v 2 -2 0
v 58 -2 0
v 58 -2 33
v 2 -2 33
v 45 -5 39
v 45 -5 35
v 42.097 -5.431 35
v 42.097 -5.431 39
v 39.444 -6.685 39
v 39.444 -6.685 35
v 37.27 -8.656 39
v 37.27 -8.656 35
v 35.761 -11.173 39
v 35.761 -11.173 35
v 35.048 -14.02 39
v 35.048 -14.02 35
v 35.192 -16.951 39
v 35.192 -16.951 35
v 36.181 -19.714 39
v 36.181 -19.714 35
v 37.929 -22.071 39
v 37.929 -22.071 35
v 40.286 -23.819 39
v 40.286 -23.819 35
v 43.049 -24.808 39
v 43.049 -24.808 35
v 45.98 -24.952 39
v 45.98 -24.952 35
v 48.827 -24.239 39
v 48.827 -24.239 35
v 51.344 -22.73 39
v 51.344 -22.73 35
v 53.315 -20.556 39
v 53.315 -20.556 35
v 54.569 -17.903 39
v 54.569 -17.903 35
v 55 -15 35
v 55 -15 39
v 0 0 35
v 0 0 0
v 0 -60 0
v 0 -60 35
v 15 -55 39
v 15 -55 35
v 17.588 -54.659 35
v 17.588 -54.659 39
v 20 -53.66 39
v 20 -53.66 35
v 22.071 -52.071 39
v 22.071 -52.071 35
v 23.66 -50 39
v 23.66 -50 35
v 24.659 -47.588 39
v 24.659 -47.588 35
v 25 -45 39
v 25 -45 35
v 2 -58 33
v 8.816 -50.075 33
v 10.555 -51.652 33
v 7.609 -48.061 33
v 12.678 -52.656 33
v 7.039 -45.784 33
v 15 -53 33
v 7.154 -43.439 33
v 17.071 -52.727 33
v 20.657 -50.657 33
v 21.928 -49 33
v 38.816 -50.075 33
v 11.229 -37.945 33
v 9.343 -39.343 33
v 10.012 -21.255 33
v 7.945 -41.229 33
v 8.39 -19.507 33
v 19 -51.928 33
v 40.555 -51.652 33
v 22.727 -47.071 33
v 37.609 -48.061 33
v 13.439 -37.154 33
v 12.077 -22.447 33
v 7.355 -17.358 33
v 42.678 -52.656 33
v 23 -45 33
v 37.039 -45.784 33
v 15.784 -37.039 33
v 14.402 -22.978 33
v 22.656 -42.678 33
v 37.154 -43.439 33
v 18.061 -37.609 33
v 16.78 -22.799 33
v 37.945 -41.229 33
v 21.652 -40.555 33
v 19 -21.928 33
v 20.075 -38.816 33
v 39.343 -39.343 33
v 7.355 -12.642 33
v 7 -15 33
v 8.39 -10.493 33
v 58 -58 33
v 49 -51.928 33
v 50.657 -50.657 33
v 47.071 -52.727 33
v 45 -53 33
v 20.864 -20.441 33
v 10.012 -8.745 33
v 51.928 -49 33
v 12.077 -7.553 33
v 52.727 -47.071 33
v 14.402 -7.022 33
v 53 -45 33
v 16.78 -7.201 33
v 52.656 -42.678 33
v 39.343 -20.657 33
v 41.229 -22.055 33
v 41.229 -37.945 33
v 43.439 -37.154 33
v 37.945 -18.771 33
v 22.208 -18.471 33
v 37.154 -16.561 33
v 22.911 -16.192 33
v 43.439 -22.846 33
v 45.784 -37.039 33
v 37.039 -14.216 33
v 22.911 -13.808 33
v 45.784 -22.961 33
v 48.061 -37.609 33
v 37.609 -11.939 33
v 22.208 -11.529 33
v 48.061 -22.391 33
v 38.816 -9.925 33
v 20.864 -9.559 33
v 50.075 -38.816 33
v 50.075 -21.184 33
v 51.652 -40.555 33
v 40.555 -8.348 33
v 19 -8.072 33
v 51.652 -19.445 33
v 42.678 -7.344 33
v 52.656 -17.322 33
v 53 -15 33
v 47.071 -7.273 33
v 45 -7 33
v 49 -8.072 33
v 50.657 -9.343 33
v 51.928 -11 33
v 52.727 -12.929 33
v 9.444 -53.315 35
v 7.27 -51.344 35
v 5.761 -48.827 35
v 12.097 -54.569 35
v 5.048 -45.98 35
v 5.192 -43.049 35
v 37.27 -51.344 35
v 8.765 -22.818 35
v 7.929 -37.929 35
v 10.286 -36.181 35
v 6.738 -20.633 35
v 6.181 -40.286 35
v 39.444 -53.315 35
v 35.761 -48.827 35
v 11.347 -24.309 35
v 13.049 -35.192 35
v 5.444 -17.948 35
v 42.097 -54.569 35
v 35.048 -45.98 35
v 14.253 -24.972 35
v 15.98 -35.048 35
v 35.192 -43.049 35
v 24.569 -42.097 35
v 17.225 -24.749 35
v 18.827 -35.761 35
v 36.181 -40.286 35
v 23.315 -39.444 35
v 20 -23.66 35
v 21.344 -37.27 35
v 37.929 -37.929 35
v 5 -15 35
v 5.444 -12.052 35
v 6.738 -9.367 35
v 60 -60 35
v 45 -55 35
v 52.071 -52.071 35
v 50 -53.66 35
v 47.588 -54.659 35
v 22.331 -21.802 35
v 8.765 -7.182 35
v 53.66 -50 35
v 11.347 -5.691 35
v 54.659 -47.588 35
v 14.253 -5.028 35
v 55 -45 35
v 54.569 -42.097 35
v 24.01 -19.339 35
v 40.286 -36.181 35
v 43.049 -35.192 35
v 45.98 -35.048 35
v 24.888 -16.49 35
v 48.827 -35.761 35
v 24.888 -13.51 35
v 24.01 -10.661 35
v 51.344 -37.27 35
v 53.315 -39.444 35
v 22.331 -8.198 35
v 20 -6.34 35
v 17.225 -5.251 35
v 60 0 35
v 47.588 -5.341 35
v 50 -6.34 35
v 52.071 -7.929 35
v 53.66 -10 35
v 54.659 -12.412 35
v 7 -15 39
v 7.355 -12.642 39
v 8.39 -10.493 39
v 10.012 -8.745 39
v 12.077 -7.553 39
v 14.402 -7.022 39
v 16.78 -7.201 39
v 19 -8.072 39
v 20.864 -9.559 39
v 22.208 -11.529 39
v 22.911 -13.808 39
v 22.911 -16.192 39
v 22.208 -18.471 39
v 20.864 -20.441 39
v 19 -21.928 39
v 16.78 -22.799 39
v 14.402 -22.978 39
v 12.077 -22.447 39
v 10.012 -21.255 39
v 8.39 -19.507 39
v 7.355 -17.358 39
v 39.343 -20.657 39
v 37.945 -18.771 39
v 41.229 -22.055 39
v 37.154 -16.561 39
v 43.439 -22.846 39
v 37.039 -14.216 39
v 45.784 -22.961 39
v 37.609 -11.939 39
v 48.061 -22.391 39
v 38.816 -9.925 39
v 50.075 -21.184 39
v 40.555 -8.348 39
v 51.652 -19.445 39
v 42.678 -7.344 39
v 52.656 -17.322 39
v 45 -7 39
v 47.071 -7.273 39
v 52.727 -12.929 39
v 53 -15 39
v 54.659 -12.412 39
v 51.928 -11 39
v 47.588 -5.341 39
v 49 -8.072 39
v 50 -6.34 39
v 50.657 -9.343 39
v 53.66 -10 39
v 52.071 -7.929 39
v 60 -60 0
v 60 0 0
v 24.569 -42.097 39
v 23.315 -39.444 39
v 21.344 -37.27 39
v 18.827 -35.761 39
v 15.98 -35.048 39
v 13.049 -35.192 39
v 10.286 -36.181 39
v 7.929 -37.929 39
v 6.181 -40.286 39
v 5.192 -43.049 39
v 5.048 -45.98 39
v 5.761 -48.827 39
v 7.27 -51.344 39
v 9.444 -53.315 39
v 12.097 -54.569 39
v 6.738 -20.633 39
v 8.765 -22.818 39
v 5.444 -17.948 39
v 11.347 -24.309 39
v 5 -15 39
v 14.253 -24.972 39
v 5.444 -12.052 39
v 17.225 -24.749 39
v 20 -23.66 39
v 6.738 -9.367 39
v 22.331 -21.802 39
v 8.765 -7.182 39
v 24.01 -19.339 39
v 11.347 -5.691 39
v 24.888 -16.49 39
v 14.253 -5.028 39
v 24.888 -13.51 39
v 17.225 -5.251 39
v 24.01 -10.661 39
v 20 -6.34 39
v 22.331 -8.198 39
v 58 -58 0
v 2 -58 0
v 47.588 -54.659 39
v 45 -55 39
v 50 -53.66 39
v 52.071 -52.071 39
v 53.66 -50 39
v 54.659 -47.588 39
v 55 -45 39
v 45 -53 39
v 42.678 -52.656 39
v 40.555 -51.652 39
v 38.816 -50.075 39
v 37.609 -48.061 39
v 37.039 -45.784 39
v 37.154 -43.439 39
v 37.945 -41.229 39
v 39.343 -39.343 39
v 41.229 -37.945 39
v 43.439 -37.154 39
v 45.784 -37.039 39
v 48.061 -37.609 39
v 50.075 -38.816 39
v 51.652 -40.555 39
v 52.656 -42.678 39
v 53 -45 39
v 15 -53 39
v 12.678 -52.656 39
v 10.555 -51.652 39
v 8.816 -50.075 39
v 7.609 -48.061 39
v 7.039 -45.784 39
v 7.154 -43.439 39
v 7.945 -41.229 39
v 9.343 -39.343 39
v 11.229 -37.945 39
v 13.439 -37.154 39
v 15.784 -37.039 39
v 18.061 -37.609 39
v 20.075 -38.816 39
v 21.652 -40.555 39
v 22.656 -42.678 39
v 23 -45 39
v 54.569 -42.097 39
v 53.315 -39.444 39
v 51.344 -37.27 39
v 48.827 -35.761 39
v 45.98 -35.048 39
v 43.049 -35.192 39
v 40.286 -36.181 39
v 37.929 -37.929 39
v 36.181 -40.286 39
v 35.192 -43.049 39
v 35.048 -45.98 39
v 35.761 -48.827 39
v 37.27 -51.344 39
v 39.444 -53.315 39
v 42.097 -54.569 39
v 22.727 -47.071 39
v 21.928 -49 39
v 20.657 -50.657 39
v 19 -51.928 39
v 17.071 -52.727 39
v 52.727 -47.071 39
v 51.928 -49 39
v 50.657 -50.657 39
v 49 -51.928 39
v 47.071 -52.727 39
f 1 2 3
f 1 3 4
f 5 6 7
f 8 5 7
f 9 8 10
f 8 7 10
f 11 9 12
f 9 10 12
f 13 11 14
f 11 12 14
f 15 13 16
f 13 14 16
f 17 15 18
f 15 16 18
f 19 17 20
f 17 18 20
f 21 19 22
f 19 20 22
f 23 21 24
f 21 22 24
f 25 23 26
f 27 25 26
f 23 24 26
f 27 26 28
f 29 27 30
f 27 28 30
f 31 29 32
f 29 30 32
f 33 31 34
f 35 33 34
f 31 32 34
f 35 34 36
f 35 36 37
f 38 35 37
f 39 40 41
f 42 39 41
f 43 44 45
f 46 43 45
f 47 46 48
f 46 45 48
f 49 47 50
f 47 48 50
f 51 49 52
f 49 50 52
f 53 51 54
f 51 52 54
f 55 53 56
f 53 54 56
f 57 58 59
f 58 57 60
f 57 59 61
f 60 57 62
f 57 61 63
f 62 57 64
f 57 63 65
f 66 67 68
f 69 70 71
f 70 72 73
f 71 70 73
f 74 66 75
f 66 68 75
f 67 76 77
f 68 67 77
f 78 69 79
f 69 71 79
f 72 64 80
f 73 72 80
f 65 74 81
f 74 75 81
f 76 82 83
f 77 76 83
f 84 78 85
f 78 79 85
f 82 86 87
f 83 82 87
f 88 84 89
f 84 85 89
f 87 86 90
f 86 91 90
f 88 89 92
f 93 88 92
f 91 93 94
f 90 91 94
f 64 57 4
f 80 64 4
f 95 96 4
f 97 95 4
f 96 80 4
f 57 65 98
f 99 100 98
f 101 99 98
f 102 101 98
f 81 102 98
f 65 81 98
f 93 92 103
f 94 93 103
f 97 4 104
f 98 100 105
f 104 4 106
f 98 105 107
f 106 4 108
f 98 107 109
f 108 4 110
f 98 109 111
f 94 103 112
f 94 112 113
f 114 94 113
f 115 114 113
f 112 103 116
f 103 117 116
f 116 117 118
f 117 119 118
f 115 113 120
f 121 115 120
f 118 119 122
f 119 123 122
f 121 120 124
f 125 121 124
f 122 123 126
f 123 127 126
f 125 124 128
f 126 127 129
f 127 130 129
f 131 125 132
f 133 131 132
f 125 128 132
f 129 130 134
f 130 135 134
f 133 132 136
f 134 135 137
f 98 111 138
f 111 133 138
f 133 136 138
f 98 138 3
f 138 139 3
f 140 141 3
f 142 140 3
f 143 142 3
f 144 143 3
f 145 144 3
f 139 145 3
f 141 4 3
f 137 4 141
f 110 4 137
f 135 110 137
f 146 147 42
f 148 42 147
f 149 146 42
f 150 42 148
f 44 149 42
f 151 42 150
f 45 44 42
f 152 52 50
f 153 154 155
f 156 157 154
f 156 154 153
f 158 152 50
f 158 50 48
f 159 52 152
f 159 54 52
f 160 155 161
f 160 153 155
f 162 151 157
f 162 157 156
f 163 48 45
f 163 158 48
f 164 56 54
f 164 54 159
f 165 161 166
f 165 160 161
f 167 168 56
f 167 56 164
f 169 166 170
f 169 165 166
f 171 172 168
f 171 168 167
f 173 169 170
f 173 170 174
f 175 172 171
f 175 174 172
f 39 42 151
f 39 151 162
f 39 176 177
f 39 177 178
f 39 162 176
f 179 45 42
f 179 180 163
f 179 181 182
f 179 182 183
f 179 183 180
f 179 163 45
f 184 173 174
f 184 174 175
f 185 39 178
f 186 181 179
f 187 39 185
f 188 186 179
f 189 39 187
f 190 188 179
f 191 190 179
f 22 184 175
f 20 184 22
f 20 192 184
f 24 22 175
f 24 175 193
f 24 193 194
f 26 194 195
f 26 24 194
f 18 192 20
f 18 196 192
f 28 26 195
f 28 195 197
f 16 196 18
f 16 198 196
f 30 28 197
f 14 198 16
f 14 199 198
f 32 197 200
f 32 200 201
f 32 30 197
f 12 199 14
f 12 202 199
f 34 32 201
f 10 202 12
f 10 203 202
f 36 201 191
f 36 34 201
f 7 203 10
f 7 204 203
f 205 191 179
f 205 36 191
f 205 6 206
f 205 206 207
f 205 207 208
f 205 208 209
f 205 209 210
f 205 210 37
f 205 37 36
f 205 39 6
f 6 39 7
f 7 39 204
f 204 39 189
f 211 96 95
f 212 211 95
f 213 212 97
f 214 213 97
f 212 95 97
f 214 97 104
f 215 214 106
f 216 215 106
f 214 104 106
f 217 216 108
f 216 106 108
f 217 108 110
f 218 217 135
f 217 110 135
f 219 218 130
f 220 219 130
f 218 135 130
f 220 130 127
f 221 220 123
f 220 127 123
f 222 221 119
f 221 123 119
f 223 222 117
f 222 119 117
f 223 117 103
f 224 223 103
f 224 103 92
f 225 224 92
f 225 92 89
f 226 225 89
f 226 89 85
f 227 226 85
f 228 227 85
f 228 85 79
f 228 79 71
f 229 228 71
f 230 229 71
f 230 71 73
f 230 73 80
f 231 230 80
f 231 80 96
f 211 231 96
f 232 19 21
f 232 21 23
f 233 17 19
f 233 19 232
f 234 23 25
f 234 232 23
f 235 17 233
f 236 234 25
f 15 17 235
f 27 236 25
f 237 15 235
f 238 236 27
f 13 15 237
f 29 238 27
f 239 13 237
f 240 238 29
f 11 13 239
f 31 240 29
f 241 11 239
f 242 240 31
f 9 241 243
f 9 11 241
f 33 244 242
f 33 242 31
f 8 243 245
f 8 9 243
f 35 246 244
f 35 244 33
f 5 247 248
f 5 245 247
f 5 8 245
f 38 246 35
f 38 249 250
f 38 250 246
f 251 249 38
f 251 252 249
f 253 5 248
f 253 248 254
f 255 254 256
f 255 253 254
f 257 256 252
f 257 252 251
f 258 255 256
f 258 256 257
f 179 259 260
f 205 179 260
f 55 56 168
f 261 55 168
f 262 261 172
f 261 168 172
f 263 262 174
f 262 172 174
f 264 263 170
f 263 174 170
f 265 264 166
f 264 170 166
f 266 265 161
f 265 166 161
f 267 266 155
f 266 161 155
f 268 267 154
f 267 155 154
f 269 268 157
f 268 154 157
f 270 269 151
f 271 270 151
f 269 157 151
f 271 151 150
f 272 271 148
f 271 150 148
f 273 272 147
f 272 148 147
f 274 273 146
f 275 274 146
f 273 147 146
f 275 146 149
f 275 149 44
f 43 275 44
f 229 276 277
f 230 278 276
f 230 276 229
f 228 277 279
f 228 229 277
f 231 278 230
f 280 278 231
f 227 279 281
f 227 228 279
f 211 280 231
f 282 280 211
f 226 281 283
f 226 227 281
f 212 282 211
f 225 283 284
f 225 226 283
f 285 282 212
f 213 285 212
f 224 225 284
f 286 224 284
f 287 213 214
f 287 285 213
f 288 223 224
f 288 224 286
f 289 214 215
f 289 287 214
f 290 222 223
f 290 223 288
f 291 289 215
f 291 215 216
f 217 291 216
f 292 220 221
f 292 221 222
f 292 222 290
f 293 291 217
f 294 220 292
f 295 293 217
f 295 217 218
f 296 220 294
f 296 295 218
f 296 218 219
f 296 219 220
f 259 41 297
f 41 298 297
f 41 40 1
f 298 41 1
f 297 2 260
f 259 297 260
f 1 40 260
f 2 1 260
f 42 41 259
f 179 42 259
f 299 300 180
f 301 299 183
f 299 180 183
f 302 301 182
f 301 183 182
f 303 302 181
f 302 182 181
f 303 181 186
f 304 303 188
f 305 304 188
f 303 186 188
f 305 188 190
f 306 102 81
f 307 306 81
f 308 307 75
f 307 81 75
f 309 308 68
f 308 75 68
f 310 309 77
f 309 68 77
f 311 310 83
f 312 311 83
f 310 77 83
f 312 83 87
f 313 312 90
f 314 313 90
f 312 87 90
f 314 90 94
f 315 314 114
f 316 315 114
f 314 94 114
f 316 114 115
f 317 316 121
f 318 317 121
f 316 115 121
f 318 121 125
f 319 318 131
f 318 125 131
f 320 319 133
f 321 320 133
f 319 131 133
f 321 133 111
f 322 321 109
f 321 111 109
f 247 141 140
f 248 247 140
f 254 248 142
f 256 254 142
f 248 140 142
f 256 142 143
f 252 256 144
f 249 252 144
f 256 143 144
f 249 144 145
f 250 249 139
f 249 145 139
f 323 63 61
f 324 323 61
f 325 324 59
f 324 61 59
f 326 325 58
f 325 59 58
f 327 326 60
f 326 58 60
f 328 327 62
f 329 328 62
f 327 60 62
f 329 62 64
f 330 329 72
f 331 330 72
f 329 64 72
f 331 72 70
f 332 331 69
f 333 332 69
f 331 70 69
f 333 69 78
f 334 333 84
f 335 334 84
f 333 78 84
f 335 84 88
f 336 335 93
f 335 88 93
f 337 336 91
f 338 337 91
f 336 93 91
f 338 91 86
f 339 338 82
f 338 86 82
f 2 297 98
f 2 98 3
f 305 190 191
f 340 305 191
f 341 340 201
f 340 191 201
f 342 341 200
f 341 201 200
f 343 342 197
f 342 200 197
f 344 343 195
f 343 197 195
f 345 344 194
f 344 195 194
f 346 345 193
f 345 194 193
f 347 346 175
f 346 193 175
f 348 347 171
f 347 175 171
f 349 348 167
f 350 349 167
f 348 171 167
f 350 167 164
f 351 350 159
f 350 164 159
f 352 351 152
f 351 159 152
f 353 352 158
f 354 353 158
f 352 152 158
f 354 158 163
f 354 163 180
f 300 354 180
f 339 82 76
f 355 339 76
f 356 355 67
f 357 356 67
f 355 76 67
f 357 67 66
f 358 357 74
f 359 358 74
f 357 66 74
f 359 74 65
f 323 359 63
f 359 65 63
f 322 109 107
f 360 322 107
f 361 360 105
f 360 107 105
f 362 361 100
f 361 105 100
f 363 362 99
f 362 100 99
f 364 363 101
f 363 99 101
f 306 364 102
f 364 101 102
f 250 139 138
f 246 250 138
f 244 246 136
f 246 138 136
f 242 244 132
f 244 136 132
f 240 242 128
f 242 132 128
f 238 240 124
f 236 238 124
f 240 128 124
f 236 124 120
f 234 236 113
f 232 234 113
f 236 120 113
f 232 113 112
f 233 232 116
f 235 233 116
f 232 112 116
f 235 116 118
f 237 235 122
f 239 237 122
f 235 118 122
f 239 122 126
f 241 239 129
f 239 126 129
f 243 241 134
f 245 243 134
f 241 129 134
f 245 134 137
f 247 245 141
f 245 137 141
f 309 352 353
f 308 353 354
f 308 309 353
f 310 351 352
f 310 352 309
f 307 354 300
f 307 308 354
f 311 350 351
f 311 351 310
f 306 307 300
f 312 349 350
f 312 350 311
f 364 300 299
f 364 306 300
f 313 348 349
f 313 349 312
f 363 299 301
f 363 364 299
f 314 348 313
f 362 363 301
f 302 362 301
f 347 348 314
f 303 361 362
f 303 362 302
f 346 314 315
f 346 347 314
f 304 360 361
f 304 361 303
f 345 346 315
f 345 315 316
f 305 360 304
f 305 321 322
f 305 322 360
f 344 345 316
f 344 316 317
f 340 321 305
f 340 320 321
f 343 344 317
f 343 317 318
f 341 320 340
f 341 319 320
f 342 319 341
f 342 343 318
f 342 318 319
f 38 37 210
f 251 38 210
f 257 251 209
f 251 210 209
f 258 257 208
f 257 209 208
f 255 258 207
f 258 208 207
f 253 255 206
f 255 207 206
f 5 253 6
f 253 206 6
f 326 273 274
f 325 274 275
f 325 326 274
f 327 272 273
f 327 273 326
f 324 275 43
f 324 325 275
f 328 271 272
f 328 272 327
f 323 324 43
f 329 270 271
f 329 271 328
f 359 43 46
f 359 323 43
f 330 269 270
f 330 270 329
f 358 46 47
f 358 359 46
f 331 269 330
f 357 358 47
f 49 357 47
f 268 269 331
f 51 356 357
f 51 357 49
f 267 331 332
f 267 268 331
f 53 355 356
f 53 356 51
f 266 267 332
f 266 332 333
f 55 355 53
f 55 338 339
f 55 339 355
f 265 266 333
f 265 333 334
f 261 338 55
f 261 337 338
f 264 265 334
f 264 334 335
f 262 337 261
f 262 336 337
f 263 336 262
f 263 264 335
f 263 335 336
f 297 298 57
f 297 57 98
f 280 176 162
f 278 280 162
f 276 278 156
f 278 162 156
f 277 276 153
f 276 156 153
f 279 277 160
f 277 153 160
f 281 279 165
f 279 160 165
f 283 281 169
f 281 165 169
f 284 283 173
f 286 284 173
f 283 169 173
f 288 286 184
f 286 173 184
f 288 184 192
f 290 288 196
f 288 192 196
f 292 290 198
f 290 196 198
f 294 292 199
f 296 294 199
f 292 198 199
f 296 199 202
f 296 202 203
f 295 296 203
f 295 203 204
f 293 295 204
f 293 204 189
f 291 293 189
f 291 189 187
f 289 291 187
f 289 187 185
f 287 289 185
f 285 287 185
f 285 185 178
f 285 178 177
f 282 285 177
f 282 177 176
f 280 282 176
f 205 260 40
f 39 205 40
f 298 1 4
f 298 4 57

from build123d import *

# Parameters (mm, degrees)
F1_DEPTH = 39
F2_DEPTH = 35
F4_DEPTH = 33


with BuildPart() as f1:
    # F0 (on Top) → F1 (new body)
    with BuildSketch(Plane.XY):
        with BuildLine():
            ThreePointArc((55, -15), (52.0710678119, -7.9289321881), (45, -5))
            ThreePointArc((45, -5), (37.9289321881, -22.0710678119), (55, -15))
        make_face()
        with BuildLine():
            ThreePointArc((53, -15), (39.3431457505, -20.6568542495), (45, -7))
            ThreePointArc((45, -7), (50.6568542495, -9.3431457505), (53, -15))
        make_face(mode=Mode.SUBTRACT)
    extrude(amount=F1_DEPTH)



with BuildPart() as f1b:
    # F0 (on Top) → F1, piece 2 (new body)
    with BuildSketch(Plane.XY):
        with BuildLine():
            ThreePointArc((25, -15), (15, -5), (5, -15))
            ThreePointArc((5, -15), (15, -25), (25, -15))
        make_face()
        with BuildLine():
            ThreePointArc((23, -15), (15, -23), (7, -15))
            ThreePointArc((7, -15), (15, -7), (23, -15))
        make_face(mode=Mode.SUBTRACT)
    extrude(amount=F1_DEPTH)


with BuildPart() as f1c:
    # F0 (on Top) → F1, piece 3 (new body)
    with BuildSketch(Plane.XY):
        with BuildLine():
            ThreePointArc((25, -45), (7.9289321881, -37.9289321881), (15, -55))
            ThreePointArc((15, -55), (22.0710678119, -52.0710678119), (25, -45))
        make_face()
        with BuildLine():
            ThreePointArc((23, -45), (20.6568542495, -50.6568542495), (15, -53))
            ThreePointArc((15, -53), (9.3431457505, -39.3431457505), (23, -45))
        make_face(mode=Mode.SUBTRACT)
    extrude(amount=F1_DEPTH)


with BuildPart() as f1d:
    # F0 (on Top) → F1, piece 4 (new body)
    with BuildSketch(Plane.XY):
        with BuildLine():
            ThreePointArc((55, -45), (37.9289321881, -37.9289321881), (45, -55))
            ThreePointArc((45, -55), (52.0710678119, -52.0710678119), (55, -45))
        make_face()
        with BuildLine():
            ThreePointArc((53, -45), (50.6568542495, -50.6568542495), (45, -53))
            ThreePointArc((45, -53), (39.3431457505, -39.3431457505), (53, -45))
        make_face(mode=Mode.SUBTRACT)
    extrude(amount=F1_DEPTH)


with BuildPart() as f1_1:
    add(f1.part)

    add(f1b.part)  # F2 merges F1b

    add(f1c.part)  # F2 merges F1c

    add(f1d.part)  # F2 merges F1d
    # F0 (on Top) → F2 (join)
    with BuildSketch(Plane.XY):
        Polygon((15, 0), (0, 0), (0, -15), (0, -45), (0, -60), (15, -60), (45, -60), (60, -60), (60, -45), (60, -8.6315972731), (60, 0), (45, 0), align=None)
        with BuildLine():
            ThreePointArc((25, -45), (22.0710678119, -52.0710678119), (15, -55))
            ThreePointArc((15, -55), (7.9289321881, -37.9289321881), (25, -45))
        make_face(mode=Mode.SUBTRACT)
        with BuildLine():
            ThreePointArc((55, -45), (52.0710678119, -52.0710678119), (45, -55))
            ThreePointArc((45, -55), (37.9289321881, -37.9289321881), (55, -45))
        make_face(mode=Mode.SUBTRACT)
        with BuildLine():
            ThreePointArc((25, -15), (15, -25), (5, -15))
            ThreePointArc((5, -15), (15, -5), (25, -15))
        make_face(mode=Mode.SUBTRACT)
        with BuildLine():
            ThreePointArc((55, -15), (37.9289321881, -22.0710678119), (45, -5))
            ThreePointArc((45, -5), (52.0710678119, -7.9289321881), (55, -15))
        make_face(mode=Mode.SUBTRACT)
    extrude(amount=F2_DEPTH)

    # F3 (on Top) → F4 (cut)
    with BuildSketch(Plane.XY):
        Polygon((2, -30), (2, -58), (58, -58), (58, -2), (2, -2), align=None)
    extrude(amount=F4_DEPTH, mode=Mode.SUBTRACT)


solid = f1_1.part
